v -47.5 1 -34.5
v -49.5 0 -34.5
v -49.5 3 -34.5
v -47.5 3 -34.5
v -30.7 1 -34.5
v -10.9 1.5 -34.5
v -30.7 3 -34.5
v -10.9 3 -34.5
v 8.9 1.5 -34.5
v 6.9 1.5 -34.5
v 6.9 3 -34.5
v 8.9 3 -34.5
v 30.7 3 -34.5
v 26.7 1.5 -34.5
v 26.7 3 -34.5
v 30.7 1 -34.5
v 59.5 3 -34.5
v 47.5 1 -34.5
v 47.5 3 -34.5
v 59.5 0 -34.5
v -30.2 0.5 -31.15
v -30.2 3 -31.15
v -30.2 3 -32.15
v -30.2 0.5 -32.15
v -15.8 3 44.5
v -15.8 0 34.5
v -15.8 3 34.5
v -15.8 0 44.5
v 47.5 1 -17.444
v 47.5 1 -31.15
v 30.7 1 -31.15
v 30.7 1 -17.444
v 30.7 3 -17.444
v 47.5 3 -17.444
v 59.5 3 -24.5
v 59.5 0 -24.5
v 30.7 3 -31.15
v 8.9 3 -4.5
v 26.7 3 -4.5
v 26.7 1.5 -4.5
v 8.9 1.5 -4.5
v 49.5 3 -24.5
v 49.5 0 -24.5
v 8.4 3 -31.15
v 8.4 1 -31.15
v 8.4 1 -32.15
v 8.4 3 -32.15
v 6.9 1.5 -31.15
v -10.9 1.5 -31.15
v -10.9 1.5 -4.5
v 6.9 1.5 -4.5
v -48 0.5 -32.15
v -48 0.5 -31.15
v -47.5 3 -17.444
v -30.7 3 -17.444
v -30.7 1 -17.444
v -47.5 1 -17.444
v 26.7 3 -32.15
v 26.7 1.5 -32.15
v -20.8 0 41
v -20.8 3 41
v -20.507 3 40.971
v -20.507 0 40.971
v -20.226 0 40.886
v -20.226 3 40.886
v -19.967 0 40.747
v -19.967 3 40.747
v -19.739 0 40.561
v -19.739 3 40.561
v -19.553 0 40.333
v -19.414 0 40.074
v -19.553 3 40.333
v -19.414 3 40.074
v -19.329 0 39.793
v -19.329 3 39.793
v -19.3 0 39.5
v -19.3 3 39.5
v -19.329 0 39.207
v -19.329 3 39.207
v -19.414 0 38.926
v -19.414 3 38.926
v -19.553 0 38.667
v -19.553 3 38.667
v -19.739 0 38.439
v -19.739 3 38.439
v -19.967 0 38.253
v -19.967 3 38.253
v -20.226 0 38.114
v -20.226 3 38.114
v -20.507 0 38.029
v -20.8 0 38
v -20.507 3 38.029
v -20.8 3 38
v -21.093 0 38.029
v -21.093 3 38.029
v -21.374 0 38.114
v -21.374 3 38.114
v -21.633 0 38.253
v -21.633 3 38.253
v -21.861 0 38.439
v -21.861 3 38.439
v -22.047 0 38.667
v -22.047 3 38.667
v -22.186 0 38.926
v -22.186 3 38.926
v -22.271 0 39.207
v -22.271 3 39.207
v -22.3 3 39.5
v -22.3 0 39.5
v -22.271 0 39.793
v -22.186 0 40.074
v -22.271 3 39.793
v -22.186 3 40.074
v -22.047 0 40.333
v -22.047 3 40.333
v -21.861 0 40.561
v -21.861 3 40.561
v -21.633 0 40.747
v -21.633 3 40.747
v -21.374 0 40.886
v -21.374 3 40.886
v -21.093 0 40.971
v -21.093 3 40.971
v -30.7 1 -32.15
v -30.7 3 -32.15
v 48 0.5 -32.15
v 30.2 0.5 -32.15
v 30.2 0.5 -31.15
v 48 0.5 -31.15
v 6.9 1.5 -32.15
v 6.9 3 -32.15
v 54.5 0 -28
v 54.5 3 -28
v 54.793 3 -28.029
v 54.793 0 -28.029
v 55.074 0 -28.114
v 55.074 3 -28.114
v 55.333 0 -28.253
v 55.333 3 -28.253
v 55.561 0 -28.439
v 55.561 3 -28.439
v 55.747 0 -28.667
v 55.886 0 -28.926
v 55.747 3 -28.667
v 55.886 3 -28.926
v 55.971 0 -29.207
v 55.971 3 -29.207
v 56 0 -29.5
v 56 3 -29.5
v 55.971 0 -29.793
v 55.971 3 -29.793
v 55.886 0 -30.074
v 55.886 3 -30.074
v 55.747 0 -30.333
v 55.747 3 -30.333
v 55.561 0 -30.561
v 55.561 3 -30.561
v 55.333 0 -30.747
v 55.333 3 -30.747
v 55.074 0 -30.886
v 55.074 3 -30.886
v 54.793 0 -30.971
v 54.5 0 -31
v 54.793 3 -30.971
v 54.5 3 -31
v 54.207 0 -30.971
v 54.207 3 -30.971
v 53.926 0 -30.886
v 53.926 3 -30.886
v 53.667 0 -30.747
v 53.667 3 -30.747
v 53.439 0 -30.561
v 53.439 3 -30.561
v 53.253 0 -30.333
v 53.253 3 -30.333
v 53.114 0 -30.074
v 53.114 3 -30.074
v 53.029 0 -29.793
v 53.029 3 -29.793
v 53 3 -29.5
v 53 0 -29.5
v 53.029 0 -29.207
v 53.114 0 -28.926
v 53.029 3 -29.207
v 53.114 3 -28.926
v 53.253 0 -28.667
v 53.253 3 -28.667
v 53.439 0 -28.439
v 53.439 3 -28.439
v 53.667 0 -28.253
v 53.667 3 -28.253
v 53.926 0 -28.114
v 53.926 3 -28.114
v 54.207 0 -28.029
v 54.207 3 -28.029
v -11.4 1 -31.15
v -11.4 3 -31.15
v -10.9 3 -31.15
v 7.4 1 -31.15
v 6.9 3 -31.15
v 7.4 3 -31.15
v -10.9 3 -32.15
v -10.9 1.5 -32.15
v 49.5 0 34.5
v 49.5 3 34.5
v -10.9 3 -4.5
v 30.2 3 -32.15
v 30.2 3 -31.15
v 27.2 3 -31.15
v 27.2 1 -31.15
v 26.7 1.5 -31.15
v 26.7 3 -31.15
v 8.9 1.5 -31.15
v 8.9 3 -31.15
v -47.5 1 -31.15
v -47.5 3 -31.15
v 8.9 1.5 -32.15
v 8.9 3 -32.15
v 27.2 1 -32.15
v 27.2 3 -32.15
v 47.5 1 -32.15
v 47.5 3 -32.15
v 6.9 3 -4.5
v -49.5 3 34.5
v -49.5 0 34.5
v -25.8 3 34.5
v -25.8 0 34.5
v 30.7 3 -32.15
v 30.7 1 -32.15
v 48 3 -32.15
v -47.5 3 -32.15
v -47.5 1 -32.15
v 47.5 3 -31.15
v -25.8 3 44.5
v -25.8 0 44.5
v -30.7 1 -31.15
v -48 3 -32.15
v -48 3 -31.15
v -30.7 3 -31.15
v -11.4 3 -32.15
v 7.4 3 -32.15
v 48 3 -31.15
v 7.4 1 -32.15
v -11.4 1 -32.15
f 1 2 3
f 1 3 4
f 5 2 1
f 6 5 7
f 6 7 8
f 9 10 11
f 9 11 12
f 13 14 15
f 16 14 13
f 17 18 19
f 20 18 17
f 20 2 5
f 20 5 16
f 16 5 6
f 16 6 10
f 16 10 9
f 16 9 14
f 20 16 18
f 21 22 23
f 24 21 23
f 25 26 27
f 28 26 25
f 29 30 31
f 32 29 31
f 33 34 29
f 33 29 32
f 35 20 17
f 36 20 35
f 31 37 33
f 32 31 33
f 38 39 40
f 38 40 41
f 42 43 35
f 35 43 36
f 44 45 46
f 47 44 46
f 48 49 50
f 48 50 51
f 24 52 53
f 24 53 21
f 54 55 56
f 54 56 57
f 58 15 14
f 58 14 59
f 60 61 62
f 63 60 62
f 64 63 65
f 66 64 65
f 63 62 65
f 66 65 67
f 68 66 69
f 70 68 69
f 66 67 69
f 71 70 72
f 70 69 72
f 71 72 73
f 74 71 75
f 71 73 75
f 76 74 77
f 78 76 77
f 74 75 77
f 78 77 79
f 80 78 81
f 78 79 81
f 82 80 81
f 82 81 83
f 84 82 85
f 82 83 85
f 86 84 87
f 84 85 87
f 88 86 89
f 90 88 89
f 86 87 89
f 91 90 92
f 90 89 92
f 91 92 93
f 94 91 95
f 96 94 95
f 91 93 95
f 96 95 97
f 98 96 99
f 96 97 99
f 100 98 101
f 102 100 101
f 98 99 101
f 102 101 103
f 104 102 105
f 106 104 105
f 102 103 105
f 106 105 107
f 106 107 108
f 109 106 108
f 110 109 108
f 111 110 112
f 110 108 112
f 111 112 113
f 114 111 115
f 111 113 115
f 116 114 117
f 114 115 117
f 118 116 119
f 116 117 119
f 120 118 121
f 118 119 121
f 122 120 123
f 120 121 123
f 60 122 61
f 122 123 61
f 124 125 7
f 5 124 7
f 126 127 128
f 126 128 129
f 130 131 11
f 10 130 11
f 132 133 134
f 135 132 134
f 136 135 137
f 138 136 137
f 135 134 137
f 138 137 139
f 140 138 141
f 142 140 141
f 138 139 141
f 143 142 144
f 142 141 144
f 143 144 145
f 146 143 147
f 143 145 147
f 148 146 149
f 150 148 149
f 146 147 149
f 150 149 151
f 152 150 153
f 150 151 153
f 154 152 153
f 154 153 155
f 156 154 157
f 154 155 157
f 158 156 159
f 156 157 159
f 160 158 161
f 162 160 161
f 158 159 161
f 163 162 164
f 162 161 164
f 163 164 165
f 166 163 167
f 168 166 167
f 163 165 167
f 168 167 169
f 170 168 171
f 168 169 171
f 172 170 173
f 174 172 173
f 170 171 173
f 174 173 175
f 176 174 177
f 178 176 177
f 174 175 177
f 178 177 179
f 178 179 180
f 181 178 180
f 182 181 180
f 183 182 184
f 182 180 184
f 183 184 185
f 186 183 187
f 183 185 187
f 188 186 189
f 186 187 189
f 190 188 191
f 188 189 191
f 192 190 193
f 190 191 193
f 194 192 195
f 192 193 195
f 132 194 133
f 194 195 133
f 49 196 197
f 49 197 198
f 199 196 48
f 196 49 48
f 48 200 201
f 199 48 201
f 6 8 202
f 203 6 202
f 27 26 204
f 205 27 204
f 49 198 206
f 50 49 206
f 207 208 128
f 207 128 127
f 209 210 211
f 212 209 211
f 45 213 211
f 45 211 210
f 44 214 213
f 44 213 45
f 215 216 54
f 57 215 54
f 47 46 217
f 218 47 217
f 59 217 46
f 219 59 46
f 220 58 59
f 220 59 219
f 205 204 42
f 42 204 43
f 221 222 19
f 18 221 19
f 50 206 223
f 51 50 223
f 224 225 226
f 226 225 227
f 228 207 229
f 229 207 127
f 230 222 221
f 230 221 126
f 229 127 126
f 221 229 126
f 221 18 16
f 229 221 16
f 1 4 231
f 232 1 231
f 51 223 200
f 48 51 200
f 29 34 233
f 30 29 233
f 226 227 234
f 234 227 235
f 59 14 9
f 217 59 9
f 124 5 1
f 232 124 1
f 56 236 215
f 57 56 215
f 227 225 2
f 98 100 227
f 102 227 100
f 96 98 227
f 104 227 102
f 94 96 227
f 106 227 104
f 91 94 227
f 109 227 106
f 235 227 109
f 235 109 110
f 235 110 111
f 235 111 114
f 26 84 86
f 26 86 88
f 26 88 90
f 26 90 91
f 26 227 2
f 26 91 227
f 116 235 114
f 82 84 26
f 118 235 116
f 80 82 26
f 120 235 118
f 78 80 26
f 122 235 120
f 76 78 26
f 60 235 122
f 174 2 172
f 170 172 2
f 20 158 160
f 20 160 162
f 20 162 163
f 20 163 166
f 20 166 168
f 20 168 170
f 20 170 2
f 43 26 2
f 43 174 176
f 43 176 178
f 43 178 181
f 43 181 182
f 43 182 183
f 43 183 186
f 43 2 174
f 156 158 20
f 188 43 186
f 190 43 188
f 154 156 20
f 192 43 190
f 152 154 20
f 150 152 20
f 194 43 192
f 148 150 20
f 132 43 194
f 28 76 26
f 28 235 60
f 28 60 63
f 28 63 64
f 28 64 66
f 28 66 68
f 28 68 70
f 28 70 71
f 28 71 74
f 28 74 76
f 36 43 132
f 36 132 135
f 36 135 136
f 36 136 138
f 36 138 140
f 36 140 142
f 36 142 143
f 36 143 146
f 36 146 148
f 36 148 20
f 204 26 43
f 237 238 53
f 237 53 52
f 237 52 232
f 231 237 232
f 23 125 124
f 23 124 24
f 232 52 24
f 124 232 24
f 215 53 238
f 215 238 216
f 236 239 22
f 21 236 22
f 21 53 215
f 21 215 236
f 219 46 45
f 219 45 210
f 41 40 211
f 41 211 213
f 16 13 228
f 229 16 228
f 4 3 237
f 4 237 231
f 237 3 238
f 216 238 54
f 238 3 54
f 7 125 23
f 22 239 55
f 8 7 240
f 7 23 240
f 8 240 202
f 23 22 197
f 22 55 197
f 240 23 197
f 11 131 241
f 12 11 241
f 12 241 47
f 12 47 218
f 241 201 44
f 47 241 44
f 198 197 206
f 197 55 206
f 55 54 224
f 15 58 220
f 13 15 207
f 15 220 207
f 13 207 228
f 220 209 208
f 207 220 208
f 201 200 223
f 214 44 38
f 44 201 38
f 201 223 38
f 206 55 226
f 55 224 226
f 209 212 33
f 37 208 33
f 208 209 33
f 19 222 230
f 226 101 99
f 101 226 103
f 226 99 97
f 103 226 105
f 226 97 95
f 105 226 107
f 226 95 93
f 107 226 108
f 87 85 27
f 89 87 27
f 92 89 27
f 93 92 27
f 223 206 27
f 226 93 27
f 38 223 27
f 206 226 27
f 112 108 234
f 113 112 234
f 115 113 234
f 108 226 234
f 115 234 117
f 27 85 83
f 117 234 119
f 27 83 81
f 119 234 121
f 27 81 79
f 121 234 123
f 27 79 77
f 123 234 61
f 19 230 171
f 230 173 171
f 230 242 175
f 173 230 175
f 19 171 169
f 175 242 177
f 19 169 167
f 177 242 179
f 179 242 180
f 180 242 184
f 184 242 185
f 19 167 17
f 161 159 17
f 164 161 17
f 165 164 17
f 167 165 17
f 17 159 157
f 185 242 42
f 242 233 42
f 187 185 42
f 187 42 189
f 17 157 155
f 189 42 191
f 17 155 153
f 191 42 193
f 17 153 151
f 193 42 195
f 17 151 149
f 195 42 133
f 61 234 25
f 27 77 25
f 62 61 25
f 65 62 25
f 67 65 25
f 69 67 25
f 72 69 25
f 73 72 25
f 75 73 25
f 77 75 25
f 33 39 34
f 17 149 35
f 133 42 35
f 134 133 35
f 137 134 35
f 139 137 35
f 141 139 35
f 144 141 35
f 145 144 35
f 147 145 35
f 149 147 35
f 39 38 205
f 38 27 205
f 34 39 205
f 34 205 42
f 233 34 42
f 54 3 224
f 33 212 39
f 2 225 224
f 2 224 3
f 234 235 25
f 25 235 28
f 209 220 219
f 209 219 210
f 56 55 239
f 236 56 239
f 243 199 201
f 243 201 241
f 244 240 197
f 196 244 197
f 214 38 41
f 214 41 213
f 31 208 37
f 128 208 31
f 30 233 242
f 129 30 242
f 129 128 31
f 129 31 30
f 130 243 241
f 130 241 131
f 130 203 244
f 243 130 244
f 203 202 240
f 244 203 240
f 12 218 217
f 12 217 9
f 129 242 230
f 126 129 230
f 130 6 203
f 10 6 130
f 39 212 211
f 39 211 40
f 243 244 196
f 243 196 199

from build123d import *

# Parameters (mm, degrees)
SKETCH1_W           = 99
SKETCH1_H           = 69
BOSS_EXTRUDE1_DEPTH = 3
CUT_EXTRUDE1_DEPTH  = 2
SKETCH6_W           = 0.5
SKETCH6_H           = 1
CUT_EXTRUDE3_DEPTH  = 2
SKETCH5_W           = 17.8
SKETCH5_H           = 1
CUT_EXTRUDE2_DEPTH  = 0.5
CUT_EXTRUDE4_DEPTH  = 1.5
SKETCH8_W           = 18.8
SKETCH8_H           = 1
CUT_EXTRUDE5_DEPTH  = 0.5
SKETCH9_W           = 10
SKETCH9_H           = 10
BOSS_EXTRUDE2_DEPTH = 3
SKETCH10_R          = 1.5
CUT_EXTRUDE6_DEPTH  = 3


with BuildPart() as part:
    # Sketch1 → Boss-Extrude1 (new body)
    with BuildSketch(Plane(origin=(0, 0, 0), x_dir=(1, 0, 0), z_dir=(0, 1, 0))):
        Rectangle(SKETCH1_W, SKETCH1_H)
    extrude(amount=BOSS_EXTRUDE1_DEPTH)

    # Sketch4 → Cut-Extrude1 (cut)
    with BuildSketch(Plane(origin=(0, 3, 0), x_dir=(1, 0, 0), z_dir=(0, 1, 0))):
        Polygon((47.5, 31.149720819), (47.5, 17.443513176), (30.7, 17.443513176), (30.7, 31.149720819), (30.7, 34.5), (47.5, 34.5), align=None)
        Polygon((-47.5, 17.443513176), (-47.5, 31.149720819), (-47.5, 34.5), (-30.7, 34.5), (-30.7, 31.149720819), (-30.7, 17.443513176), align=None)
    extrude(amount=-CUT_EXTRUDE1_DEPTH, mode=Mode.SUBTRACT)

    # Sketch6 → Cut-Extrude3 (cut)
    with BuildSketch(Plane(origin=(0, 1, 0), x_dir=(1, 0, 0), z_dir=(0, 1, 0))):
        with Locations((-47.75, 31.649720819)):
            Rectangle(SKETCH6_W, SKETCH6_H)
        with Locations((-30.45, 31.649720819)):
            Rectangle(SKETCH6_W, SKETCH6_H)
        with Locations((47.75, 31.649720819)):
            Rectangle(SKETCH6_W, SKETCH6_H)
        with Locations((30.45, 31.649720819)):
            Rectangle(SKETCH6_W, SKETCH6_H)
    extrude(amount=CUT_EXTRUDE3_DEPTH, mode=Mode.SUBTRACT)

    # Sketch5 → Cut-Extrude2 (cut)
    with BuildSketch(Plane(origin=(0, 1, 0), x_dir=(1, 0, 0), z_dir=(0, 1, 0))):
        with Locations((39.1, 31.649720819)):
            Rectangle(SKETCH5_W, SKETCH5_H)
        with Locations((-39.1, 31.649720819)):
            Rectangle(SKETCH5_W, SKETCH5_H)
    extrude(amount=-CUT_EXTRUDE2_DEPTH, mode=Mode.SUBTRACT)

    # Sketch7 → Cut-Extrude4 (cut)
    with BuildSketch(Plane(origin=(0, 3, 0), x_dir=(1, 0, 0), z_dir=(0, 1, 0))):
        Polygon((-10.9, 31.149720819), (-10.9, 4.5), (6.9, 4.5), (6.9, 31.149720819), (7.4, 31.149720819), (7.4, 32.149720819), (6.9, 32.149720819), (6.9, 34.5), (-10.9, 34.5), (-10.9, 32.149720819), (-11.4, 32.149720819), (-11.4, 31.149720819), align=None)
        Polygon((8.9, 34.5), (26.7, 34.5), (26.7, 32.149720819), (27.2, 32.149720819), (27.2, 31.149720819), (26.7, 31.149720819), (26.7, 4.5), (8.9, 4.5), (8.9, 31.149720819), (8.4, 31.149720819), (8.4, 32.149720819), (8.9, 32.149720819), align=None)
    extrude(amount=-CUT_EXTRUDE4_DEPTH, mode=Mode.SUBTRACT)

    # Sketch8 → Cut-Extrude5 (cut)
    with BuildSketch(Plane(origin=(0, 1.5, 0), x_dir=(1, 0, 0), z_dir=(0, 1, 0))):
        with Locations((-2, 31.649720819)):
            Rectangle(SKETCH8_W, SKETCH8_H)
        with Locations((17.8, 31.649720819)):
            Rectangle(SKETCH8_W, SKETCH8_H)
    extrude(amount=-CUT_EXTRUDE5_DEPTH, mode=Mode.SUBTRACT)

    # Sketch9 → Boss-Extrude2 (add)
    with BuildSketch(Plane.XZ):
        with Locations((-20.8, 39.5)):
            Rectangle(SKETCH9_W, SKETCH9_H)
        with Locations((54.5, -29.5)):
            Rectangle(SKETCH9_W, SKETCH9_H)
    extrude(amount=-BOSS_EXTRUDE2_DEPTH)

    # Sketch10 → Cut-Extrude6 (cut)
    with BuildSketch(Plane(origin=(0, 3, 0), x_dir=(1, 0, 0), z_dir=(0, 1, 0))):
        with Locations(Location((-20.8, -39.5, 0), (0, 0, 270))):
            Circle(SKETCH10_R)
        with Locations(Location((54.5, 29.5, 0), (0, 0, 270))):
            Circle(SKETCH10_R)
    extrude(amount=-CUT_EXTRUDE6_DEPTH, mode=Mode.SUBTRACT)


solid = part.part
